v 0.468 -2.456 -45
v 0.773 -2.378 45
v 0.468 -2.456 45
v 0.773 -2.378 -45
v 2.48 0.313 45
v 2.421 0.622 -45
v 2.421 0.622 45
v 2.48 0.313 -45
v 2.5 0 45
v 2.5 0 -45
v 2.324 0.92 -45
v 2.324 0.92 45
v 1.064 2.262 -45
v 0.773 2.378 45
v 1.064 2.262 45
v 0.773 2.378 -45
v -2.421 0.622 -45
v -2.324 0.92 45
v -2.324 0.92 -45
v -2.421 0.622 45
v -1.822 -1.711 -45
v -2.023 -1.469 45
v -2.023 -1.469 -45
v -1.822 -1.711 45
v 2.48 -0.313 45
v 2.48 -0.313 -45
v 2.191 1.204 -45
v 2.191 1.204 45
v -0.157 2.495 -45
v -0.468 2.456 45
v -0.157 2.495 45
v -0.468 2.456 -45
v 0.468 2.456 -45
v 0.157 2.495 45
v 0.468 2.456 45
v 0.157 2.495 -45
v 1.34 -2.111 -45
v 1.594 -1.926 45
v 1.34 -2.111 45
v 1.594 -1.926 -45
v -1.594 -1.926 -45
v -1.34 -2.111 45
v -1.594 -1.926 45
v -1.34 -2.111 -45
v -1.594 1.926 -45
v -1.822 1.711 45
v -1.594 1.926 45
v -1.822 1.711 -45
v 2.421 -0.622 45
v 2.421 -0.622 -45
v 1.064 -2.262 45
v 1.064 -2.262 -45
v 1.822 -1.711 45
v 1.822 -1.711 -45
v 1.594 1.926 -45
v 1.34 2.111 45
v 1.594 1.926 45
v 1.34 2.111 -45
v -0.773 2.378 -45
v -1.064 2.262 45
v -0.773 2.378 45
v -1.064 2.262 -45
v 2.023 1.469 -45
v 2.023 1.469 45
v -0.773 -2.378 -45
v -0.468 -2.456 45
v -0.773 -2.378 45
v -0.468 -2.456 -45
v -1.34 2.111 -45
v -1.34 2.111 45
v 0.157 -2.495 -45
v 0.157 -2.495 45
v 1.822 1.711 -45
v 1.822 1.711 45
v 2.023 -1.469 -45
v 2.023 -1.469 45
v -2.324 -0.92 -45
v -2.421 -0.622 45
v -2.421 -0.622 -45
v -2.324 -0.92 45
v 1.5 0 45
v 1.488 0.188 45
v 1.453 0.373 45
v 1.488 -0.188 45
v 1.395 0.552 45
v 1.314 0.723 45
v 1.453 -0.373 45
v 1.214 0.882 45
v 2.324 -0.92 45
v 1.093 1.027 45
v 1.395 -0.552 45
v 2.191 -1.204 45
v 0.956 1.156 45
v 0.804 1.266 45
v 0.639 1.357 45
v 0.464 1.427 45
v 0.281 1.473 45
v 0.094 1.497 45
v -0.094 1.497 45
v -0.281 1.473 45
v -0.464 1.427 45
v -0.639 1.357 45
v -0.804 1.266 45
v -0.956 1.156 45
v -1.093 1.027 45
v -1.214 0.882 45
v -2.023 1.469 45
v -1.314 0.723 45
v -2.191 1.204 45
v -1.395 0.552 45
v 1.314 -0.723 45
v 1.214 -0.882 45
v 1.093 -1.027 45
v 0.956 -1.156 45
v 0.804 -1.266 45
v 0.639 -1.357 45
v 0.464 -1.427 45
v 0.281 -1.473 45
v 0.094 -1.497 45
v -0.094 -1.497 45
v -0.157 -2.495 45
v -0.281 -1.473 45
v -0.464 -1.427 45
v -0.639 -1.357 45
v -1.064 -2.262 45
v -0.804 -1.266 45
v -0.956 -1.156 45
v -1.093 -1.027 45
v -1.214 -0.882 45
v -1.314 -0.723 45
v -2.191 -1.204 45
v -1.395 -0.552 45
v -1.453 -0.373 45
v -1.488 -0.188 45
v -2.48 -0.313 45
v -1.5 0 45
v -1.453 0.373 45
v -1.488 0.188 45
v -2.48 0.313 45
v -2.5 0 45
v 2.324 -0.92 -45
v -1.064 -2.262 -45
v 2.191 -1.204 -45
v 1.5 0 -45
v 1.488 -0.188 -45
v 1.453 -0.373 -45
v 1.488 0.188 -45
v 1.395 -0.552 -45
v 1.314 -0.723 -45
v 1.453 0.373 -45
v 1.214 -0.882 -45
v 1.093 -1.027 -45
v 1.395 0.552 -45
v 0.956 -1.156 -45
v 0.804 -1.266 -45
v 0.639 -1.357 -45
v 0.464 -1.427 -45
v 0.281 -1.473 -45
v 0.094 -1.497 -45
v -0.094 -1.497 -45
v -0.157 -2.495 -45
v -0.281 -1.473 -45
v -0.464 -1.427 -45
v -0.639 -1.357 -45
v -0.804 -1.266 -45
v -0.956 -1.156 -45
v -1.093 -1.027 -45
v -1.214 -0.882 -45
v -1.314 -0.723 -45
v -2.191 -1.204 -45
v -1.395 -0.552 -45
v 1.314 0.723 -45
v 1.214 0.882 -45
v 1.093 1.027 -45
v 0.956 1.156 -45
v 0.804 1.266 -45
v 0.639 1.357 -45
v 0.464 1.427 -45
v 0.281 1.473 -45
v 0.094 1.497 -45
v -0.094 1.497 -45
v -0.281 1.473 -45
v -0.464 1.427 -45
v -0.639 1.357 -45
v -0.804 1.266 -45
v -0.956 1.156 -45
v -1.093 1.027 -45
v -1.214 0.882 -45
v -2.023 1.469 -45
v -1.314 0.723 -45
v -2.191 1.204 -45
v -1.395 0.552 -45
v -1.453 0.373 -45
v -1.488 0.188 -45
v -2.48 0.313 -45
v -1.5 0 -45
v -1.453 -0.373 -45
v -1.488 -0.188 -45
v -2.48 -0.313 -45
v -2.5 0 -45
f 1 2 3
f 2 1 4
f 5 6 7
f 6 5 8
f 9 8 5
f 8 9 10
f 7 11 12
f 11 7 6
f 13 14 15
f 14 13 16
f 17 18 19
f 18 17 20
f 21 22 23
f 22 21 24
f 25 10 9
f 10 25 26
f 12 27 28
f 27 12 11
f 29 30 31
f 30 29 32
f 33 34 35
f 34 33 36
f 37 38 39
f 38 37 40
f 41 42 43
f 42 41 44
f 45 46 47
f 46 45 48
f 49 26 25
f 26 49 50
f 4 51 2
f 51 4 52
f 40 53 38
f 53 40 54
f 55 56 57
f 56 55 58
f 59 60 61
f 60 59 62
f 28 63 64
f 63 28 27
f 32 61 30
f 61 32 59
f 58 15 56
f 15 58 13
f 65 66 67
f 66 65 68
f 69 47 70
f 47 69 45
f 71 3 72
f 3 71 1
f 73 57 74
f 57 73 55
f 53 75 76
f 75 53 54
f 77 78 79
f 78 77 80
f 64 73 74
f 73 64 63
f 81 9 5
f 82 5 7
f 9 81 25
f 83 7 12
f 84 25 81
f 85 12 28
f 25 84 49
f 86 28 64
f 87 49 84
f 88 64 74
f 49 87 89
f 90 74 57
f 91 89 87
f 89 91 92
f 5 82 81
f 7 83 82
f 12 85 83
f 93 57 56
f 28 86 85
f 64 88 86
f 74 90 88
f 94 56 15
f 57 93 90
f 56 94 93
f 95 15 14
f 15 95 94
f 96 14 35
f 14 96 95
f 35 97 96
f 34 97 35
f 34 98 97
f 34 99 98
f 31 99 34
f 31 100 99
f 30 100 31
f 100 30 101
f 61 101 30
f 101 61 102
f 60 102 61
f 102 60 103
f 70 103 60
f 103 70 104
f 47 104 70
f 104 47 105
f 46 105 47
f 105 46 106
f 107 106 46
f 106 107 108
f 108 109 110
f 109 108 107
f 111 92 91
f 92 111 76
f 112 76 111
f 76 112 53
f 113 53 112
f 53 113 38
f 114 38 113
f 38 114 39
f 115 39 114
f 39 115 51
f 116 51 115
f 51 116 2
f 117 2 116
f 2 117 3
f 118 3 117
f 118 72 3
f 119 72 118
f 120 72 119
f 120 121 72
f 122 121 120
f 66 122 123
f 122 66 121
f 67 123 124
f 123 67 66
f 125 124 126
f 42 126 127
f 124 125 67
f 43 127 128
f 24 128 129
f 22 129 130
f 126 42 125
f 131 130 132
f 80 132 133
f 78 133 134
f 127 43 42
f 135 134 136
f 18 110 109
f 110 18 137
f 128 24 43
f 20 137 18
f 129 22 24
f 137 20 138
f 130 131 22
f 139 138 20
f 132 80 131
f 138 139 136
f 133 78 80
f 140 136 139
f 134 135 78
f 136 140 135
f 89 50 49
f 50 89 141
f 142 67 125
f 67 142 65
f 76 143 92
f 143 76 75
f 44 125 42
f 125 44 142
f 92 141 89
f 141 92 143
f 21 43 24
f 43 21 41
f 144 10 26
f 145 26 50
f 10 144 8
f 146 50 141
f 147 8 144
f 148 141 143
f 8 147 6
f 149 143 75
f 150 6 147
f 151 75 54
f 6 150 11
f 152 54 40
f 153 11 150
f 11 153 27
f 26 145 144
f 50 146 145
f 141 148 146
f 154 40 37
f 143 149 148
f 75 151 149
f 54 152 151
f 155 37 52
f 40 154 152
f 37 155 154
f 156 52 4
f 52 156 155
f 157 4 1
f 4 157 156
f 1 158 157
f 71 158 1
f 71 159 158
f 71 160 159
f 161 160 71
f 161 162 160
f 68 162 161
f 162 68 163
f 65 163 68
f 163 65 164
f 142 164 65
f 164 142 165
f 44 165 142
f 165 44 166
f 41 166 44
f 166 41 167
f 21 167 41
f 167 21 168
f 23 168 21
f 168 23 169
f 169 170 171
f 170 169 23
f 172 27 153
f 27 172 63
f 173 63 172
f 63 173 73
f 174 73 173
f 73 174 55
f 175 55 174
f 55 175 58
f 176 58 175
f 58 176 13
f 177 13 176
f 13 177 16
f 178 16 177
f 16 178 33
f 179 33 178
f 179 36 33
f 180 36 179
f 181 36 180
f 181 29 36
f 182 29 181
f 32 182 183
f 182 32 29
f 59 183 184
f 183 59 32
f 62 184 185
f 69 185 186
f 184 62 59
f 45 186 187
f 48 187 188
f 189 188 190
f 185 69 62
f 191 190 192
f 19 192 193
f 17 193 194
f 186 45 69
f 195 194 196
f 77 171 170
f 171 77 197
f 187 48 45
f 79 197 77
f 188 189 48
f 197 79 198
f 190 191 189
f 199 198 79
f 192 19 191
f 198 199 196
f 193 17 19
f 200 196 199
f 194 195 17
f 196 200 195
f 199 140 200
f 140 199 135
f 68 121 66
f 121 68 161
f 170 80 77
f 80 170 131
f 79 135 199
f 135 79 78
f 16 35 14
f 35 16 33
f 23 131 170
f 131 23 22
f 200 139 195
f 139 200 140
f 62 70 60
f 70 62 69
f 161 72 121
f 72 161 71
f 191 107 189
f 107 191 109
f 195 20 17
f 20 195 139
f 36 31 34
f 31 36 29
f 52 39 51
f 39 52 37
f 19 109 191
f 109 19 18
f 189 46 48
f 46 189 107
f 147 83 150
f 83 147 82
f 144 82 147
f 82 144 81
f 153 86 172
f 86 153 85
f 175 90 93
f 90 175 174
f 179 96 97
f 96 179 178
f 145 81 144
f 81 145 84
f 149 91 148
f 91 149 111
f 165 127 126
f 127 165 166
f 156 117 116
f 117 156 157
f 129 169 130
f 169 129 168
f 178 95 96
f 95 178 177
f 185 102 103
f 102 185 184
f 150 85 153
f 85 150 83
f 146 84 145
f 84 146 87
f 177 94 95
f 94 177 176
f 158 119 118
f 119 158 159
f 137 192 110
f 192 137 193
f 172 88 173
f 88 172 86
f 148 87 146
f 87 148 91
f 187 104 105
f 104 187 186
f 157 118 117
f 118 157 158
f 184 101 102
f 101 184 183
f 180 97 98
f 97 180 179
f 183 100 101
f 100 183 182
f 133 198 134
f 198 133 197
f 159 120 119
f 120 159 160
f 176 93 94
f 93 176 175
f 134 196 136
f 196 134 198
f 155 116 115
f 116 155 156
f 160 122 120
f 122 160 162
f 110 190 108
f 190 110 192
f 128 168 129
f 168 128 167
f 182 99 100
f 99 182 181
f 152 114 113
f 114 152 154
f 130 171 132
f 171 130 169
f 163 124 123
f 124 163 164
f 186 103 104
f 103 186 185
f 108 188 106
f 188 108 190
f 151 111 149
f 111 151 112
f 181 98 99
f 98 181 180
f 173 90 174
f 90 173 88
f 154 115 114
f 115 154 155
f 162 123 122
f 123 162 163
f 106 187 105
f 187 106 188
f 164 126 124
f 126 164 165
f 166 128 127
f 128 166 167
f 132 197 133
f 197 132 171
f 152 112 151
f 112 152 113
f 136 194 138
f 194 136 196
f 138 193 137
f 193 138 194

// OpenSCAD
$fn = 50;


difference() {
	union() {
		translate(v = [0, 0, -45.0000000000]) {
			cylinder(h = 90, r = 2.5000000000);
		}
	}
	union() {
		translate(v = [0, 0, -100.0000000000]) {
			cylinder(h = 200, r = 1.5000000000);
		}
	}
}
